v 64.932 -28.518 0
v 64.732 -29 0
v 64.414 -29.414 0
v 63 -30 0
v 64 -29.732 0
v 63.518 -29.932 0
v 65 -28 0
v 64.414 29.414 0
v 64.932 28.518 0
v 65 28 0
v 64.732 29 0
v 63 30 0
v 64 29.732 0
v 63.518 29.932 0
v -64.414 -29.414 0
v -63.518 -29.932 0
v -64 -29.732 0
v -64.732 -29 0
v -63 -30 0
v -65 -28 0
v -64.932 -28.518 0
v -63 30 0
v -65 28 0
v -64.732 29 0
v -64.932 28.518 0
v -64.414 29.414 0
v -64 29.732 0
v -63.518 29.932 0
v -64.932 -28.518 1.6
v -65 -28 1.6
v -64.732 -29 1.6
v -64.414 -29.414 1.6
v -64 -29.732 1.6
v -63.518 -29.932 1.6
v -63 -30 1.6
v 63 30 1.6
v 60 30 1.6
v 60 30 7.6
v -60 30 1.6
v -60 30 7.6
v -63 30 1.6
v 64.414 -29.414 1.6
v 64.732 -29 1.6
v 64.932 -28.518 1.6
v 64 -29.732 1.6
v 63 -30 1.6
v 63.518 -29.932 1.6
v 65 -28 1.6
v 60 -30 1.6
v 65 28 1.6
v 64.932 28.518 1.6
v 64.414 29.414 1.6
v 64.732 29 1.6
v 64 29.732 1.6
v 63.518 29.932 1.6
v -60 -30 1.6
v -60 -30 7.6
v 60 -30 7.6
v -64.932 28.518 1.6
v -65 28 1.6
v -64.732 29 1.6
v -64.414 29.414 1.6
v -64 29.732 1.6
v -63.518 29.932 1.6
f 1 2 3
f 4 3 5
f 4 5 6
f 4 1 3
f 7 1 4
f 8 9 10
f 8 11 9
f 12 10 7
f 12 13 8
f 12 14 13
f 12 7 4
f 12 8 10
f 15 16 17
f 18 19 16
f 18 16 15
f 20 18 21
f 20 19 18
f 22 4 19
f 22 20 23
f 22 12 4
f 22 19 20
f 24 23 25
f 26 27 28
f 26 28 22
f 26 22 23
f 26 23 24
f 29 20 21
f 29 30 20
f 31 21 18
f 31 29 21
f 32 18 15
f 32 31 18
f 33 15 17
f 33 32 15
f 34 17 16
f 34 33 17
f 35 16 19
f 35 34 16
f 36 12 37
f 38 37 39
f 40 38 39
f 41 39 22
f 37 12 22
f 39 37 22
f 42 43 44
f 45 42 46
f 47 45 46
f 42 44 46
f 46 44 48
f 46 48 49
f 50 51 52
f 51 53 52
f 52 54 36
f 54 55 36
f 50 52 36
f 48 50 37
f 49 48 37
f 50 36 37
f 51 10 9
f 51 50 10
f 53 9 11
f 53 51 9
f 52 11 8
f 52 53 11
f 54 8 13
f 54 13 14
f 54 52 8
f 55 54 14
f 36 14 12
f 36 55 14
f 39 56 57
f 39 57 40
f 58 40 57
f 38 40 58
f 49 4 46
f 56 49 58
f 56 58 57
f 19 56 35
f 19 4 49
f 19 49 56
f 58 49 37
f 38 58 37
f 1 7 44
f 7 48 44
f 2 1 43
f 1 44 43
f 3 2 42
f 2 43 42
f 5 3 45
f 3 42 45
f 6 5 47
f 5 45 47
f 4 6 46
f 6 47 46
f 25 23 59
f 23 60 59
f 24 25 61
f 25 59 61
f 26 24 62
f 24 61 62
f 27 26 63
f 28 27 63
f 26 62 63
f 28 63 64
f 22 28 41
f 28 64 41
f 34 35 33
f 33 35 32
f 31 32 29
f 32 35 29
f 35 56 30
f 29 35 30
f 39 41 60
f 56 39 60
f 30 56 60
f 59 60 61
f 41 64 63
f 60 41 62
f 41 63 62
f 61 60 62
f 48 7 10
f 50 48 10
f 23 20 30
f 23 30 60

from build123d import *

# Parameters (mm, degrees)
SKETCH_1_W      = 120
SKETCH_1_H      = 60
EXTRUDE_1_DEPTH = 7.6
SKETCH_5_W      = 130
SKETCH_5_H      = 60
EXTRUDE_2_DEPTH = 1.6
FILLET_1_R      = 2


with BuildPart() as part:
    # 草图1 → 凸台-拉伸1 (new body)
    with BuildSketch(Plane.XY):
        Rectangle(SKETCH_1_W, SKETCH_1_H)
    extrude(amount=EXTRUDE_1_DEPTH)

    # 草图5 → 凸台-拉伸2 (add)
    with BuildSketch(Plane(origin=(0, 0, 0), x_dir=(-1, 0, 0), z_dir=(0, 0, -1))):
        Rectangle(SKETCH_5_W, SKETCH_5_H)
    extrude(amount=-EXTRUDE_2_DEPTH)

    # 圆角1
    fillet_1_edges = [part.edges().sort_by_distance(p)[0] for p in [
        (65, 30, 0.8),
        (-65, -30, 0.8),
        (65, -30, 0.8),
        (-65, 30, 0.8),
    ]]
    fillet(fillet_1_edges, radius=FILLET_1_R)


solid = part.part
